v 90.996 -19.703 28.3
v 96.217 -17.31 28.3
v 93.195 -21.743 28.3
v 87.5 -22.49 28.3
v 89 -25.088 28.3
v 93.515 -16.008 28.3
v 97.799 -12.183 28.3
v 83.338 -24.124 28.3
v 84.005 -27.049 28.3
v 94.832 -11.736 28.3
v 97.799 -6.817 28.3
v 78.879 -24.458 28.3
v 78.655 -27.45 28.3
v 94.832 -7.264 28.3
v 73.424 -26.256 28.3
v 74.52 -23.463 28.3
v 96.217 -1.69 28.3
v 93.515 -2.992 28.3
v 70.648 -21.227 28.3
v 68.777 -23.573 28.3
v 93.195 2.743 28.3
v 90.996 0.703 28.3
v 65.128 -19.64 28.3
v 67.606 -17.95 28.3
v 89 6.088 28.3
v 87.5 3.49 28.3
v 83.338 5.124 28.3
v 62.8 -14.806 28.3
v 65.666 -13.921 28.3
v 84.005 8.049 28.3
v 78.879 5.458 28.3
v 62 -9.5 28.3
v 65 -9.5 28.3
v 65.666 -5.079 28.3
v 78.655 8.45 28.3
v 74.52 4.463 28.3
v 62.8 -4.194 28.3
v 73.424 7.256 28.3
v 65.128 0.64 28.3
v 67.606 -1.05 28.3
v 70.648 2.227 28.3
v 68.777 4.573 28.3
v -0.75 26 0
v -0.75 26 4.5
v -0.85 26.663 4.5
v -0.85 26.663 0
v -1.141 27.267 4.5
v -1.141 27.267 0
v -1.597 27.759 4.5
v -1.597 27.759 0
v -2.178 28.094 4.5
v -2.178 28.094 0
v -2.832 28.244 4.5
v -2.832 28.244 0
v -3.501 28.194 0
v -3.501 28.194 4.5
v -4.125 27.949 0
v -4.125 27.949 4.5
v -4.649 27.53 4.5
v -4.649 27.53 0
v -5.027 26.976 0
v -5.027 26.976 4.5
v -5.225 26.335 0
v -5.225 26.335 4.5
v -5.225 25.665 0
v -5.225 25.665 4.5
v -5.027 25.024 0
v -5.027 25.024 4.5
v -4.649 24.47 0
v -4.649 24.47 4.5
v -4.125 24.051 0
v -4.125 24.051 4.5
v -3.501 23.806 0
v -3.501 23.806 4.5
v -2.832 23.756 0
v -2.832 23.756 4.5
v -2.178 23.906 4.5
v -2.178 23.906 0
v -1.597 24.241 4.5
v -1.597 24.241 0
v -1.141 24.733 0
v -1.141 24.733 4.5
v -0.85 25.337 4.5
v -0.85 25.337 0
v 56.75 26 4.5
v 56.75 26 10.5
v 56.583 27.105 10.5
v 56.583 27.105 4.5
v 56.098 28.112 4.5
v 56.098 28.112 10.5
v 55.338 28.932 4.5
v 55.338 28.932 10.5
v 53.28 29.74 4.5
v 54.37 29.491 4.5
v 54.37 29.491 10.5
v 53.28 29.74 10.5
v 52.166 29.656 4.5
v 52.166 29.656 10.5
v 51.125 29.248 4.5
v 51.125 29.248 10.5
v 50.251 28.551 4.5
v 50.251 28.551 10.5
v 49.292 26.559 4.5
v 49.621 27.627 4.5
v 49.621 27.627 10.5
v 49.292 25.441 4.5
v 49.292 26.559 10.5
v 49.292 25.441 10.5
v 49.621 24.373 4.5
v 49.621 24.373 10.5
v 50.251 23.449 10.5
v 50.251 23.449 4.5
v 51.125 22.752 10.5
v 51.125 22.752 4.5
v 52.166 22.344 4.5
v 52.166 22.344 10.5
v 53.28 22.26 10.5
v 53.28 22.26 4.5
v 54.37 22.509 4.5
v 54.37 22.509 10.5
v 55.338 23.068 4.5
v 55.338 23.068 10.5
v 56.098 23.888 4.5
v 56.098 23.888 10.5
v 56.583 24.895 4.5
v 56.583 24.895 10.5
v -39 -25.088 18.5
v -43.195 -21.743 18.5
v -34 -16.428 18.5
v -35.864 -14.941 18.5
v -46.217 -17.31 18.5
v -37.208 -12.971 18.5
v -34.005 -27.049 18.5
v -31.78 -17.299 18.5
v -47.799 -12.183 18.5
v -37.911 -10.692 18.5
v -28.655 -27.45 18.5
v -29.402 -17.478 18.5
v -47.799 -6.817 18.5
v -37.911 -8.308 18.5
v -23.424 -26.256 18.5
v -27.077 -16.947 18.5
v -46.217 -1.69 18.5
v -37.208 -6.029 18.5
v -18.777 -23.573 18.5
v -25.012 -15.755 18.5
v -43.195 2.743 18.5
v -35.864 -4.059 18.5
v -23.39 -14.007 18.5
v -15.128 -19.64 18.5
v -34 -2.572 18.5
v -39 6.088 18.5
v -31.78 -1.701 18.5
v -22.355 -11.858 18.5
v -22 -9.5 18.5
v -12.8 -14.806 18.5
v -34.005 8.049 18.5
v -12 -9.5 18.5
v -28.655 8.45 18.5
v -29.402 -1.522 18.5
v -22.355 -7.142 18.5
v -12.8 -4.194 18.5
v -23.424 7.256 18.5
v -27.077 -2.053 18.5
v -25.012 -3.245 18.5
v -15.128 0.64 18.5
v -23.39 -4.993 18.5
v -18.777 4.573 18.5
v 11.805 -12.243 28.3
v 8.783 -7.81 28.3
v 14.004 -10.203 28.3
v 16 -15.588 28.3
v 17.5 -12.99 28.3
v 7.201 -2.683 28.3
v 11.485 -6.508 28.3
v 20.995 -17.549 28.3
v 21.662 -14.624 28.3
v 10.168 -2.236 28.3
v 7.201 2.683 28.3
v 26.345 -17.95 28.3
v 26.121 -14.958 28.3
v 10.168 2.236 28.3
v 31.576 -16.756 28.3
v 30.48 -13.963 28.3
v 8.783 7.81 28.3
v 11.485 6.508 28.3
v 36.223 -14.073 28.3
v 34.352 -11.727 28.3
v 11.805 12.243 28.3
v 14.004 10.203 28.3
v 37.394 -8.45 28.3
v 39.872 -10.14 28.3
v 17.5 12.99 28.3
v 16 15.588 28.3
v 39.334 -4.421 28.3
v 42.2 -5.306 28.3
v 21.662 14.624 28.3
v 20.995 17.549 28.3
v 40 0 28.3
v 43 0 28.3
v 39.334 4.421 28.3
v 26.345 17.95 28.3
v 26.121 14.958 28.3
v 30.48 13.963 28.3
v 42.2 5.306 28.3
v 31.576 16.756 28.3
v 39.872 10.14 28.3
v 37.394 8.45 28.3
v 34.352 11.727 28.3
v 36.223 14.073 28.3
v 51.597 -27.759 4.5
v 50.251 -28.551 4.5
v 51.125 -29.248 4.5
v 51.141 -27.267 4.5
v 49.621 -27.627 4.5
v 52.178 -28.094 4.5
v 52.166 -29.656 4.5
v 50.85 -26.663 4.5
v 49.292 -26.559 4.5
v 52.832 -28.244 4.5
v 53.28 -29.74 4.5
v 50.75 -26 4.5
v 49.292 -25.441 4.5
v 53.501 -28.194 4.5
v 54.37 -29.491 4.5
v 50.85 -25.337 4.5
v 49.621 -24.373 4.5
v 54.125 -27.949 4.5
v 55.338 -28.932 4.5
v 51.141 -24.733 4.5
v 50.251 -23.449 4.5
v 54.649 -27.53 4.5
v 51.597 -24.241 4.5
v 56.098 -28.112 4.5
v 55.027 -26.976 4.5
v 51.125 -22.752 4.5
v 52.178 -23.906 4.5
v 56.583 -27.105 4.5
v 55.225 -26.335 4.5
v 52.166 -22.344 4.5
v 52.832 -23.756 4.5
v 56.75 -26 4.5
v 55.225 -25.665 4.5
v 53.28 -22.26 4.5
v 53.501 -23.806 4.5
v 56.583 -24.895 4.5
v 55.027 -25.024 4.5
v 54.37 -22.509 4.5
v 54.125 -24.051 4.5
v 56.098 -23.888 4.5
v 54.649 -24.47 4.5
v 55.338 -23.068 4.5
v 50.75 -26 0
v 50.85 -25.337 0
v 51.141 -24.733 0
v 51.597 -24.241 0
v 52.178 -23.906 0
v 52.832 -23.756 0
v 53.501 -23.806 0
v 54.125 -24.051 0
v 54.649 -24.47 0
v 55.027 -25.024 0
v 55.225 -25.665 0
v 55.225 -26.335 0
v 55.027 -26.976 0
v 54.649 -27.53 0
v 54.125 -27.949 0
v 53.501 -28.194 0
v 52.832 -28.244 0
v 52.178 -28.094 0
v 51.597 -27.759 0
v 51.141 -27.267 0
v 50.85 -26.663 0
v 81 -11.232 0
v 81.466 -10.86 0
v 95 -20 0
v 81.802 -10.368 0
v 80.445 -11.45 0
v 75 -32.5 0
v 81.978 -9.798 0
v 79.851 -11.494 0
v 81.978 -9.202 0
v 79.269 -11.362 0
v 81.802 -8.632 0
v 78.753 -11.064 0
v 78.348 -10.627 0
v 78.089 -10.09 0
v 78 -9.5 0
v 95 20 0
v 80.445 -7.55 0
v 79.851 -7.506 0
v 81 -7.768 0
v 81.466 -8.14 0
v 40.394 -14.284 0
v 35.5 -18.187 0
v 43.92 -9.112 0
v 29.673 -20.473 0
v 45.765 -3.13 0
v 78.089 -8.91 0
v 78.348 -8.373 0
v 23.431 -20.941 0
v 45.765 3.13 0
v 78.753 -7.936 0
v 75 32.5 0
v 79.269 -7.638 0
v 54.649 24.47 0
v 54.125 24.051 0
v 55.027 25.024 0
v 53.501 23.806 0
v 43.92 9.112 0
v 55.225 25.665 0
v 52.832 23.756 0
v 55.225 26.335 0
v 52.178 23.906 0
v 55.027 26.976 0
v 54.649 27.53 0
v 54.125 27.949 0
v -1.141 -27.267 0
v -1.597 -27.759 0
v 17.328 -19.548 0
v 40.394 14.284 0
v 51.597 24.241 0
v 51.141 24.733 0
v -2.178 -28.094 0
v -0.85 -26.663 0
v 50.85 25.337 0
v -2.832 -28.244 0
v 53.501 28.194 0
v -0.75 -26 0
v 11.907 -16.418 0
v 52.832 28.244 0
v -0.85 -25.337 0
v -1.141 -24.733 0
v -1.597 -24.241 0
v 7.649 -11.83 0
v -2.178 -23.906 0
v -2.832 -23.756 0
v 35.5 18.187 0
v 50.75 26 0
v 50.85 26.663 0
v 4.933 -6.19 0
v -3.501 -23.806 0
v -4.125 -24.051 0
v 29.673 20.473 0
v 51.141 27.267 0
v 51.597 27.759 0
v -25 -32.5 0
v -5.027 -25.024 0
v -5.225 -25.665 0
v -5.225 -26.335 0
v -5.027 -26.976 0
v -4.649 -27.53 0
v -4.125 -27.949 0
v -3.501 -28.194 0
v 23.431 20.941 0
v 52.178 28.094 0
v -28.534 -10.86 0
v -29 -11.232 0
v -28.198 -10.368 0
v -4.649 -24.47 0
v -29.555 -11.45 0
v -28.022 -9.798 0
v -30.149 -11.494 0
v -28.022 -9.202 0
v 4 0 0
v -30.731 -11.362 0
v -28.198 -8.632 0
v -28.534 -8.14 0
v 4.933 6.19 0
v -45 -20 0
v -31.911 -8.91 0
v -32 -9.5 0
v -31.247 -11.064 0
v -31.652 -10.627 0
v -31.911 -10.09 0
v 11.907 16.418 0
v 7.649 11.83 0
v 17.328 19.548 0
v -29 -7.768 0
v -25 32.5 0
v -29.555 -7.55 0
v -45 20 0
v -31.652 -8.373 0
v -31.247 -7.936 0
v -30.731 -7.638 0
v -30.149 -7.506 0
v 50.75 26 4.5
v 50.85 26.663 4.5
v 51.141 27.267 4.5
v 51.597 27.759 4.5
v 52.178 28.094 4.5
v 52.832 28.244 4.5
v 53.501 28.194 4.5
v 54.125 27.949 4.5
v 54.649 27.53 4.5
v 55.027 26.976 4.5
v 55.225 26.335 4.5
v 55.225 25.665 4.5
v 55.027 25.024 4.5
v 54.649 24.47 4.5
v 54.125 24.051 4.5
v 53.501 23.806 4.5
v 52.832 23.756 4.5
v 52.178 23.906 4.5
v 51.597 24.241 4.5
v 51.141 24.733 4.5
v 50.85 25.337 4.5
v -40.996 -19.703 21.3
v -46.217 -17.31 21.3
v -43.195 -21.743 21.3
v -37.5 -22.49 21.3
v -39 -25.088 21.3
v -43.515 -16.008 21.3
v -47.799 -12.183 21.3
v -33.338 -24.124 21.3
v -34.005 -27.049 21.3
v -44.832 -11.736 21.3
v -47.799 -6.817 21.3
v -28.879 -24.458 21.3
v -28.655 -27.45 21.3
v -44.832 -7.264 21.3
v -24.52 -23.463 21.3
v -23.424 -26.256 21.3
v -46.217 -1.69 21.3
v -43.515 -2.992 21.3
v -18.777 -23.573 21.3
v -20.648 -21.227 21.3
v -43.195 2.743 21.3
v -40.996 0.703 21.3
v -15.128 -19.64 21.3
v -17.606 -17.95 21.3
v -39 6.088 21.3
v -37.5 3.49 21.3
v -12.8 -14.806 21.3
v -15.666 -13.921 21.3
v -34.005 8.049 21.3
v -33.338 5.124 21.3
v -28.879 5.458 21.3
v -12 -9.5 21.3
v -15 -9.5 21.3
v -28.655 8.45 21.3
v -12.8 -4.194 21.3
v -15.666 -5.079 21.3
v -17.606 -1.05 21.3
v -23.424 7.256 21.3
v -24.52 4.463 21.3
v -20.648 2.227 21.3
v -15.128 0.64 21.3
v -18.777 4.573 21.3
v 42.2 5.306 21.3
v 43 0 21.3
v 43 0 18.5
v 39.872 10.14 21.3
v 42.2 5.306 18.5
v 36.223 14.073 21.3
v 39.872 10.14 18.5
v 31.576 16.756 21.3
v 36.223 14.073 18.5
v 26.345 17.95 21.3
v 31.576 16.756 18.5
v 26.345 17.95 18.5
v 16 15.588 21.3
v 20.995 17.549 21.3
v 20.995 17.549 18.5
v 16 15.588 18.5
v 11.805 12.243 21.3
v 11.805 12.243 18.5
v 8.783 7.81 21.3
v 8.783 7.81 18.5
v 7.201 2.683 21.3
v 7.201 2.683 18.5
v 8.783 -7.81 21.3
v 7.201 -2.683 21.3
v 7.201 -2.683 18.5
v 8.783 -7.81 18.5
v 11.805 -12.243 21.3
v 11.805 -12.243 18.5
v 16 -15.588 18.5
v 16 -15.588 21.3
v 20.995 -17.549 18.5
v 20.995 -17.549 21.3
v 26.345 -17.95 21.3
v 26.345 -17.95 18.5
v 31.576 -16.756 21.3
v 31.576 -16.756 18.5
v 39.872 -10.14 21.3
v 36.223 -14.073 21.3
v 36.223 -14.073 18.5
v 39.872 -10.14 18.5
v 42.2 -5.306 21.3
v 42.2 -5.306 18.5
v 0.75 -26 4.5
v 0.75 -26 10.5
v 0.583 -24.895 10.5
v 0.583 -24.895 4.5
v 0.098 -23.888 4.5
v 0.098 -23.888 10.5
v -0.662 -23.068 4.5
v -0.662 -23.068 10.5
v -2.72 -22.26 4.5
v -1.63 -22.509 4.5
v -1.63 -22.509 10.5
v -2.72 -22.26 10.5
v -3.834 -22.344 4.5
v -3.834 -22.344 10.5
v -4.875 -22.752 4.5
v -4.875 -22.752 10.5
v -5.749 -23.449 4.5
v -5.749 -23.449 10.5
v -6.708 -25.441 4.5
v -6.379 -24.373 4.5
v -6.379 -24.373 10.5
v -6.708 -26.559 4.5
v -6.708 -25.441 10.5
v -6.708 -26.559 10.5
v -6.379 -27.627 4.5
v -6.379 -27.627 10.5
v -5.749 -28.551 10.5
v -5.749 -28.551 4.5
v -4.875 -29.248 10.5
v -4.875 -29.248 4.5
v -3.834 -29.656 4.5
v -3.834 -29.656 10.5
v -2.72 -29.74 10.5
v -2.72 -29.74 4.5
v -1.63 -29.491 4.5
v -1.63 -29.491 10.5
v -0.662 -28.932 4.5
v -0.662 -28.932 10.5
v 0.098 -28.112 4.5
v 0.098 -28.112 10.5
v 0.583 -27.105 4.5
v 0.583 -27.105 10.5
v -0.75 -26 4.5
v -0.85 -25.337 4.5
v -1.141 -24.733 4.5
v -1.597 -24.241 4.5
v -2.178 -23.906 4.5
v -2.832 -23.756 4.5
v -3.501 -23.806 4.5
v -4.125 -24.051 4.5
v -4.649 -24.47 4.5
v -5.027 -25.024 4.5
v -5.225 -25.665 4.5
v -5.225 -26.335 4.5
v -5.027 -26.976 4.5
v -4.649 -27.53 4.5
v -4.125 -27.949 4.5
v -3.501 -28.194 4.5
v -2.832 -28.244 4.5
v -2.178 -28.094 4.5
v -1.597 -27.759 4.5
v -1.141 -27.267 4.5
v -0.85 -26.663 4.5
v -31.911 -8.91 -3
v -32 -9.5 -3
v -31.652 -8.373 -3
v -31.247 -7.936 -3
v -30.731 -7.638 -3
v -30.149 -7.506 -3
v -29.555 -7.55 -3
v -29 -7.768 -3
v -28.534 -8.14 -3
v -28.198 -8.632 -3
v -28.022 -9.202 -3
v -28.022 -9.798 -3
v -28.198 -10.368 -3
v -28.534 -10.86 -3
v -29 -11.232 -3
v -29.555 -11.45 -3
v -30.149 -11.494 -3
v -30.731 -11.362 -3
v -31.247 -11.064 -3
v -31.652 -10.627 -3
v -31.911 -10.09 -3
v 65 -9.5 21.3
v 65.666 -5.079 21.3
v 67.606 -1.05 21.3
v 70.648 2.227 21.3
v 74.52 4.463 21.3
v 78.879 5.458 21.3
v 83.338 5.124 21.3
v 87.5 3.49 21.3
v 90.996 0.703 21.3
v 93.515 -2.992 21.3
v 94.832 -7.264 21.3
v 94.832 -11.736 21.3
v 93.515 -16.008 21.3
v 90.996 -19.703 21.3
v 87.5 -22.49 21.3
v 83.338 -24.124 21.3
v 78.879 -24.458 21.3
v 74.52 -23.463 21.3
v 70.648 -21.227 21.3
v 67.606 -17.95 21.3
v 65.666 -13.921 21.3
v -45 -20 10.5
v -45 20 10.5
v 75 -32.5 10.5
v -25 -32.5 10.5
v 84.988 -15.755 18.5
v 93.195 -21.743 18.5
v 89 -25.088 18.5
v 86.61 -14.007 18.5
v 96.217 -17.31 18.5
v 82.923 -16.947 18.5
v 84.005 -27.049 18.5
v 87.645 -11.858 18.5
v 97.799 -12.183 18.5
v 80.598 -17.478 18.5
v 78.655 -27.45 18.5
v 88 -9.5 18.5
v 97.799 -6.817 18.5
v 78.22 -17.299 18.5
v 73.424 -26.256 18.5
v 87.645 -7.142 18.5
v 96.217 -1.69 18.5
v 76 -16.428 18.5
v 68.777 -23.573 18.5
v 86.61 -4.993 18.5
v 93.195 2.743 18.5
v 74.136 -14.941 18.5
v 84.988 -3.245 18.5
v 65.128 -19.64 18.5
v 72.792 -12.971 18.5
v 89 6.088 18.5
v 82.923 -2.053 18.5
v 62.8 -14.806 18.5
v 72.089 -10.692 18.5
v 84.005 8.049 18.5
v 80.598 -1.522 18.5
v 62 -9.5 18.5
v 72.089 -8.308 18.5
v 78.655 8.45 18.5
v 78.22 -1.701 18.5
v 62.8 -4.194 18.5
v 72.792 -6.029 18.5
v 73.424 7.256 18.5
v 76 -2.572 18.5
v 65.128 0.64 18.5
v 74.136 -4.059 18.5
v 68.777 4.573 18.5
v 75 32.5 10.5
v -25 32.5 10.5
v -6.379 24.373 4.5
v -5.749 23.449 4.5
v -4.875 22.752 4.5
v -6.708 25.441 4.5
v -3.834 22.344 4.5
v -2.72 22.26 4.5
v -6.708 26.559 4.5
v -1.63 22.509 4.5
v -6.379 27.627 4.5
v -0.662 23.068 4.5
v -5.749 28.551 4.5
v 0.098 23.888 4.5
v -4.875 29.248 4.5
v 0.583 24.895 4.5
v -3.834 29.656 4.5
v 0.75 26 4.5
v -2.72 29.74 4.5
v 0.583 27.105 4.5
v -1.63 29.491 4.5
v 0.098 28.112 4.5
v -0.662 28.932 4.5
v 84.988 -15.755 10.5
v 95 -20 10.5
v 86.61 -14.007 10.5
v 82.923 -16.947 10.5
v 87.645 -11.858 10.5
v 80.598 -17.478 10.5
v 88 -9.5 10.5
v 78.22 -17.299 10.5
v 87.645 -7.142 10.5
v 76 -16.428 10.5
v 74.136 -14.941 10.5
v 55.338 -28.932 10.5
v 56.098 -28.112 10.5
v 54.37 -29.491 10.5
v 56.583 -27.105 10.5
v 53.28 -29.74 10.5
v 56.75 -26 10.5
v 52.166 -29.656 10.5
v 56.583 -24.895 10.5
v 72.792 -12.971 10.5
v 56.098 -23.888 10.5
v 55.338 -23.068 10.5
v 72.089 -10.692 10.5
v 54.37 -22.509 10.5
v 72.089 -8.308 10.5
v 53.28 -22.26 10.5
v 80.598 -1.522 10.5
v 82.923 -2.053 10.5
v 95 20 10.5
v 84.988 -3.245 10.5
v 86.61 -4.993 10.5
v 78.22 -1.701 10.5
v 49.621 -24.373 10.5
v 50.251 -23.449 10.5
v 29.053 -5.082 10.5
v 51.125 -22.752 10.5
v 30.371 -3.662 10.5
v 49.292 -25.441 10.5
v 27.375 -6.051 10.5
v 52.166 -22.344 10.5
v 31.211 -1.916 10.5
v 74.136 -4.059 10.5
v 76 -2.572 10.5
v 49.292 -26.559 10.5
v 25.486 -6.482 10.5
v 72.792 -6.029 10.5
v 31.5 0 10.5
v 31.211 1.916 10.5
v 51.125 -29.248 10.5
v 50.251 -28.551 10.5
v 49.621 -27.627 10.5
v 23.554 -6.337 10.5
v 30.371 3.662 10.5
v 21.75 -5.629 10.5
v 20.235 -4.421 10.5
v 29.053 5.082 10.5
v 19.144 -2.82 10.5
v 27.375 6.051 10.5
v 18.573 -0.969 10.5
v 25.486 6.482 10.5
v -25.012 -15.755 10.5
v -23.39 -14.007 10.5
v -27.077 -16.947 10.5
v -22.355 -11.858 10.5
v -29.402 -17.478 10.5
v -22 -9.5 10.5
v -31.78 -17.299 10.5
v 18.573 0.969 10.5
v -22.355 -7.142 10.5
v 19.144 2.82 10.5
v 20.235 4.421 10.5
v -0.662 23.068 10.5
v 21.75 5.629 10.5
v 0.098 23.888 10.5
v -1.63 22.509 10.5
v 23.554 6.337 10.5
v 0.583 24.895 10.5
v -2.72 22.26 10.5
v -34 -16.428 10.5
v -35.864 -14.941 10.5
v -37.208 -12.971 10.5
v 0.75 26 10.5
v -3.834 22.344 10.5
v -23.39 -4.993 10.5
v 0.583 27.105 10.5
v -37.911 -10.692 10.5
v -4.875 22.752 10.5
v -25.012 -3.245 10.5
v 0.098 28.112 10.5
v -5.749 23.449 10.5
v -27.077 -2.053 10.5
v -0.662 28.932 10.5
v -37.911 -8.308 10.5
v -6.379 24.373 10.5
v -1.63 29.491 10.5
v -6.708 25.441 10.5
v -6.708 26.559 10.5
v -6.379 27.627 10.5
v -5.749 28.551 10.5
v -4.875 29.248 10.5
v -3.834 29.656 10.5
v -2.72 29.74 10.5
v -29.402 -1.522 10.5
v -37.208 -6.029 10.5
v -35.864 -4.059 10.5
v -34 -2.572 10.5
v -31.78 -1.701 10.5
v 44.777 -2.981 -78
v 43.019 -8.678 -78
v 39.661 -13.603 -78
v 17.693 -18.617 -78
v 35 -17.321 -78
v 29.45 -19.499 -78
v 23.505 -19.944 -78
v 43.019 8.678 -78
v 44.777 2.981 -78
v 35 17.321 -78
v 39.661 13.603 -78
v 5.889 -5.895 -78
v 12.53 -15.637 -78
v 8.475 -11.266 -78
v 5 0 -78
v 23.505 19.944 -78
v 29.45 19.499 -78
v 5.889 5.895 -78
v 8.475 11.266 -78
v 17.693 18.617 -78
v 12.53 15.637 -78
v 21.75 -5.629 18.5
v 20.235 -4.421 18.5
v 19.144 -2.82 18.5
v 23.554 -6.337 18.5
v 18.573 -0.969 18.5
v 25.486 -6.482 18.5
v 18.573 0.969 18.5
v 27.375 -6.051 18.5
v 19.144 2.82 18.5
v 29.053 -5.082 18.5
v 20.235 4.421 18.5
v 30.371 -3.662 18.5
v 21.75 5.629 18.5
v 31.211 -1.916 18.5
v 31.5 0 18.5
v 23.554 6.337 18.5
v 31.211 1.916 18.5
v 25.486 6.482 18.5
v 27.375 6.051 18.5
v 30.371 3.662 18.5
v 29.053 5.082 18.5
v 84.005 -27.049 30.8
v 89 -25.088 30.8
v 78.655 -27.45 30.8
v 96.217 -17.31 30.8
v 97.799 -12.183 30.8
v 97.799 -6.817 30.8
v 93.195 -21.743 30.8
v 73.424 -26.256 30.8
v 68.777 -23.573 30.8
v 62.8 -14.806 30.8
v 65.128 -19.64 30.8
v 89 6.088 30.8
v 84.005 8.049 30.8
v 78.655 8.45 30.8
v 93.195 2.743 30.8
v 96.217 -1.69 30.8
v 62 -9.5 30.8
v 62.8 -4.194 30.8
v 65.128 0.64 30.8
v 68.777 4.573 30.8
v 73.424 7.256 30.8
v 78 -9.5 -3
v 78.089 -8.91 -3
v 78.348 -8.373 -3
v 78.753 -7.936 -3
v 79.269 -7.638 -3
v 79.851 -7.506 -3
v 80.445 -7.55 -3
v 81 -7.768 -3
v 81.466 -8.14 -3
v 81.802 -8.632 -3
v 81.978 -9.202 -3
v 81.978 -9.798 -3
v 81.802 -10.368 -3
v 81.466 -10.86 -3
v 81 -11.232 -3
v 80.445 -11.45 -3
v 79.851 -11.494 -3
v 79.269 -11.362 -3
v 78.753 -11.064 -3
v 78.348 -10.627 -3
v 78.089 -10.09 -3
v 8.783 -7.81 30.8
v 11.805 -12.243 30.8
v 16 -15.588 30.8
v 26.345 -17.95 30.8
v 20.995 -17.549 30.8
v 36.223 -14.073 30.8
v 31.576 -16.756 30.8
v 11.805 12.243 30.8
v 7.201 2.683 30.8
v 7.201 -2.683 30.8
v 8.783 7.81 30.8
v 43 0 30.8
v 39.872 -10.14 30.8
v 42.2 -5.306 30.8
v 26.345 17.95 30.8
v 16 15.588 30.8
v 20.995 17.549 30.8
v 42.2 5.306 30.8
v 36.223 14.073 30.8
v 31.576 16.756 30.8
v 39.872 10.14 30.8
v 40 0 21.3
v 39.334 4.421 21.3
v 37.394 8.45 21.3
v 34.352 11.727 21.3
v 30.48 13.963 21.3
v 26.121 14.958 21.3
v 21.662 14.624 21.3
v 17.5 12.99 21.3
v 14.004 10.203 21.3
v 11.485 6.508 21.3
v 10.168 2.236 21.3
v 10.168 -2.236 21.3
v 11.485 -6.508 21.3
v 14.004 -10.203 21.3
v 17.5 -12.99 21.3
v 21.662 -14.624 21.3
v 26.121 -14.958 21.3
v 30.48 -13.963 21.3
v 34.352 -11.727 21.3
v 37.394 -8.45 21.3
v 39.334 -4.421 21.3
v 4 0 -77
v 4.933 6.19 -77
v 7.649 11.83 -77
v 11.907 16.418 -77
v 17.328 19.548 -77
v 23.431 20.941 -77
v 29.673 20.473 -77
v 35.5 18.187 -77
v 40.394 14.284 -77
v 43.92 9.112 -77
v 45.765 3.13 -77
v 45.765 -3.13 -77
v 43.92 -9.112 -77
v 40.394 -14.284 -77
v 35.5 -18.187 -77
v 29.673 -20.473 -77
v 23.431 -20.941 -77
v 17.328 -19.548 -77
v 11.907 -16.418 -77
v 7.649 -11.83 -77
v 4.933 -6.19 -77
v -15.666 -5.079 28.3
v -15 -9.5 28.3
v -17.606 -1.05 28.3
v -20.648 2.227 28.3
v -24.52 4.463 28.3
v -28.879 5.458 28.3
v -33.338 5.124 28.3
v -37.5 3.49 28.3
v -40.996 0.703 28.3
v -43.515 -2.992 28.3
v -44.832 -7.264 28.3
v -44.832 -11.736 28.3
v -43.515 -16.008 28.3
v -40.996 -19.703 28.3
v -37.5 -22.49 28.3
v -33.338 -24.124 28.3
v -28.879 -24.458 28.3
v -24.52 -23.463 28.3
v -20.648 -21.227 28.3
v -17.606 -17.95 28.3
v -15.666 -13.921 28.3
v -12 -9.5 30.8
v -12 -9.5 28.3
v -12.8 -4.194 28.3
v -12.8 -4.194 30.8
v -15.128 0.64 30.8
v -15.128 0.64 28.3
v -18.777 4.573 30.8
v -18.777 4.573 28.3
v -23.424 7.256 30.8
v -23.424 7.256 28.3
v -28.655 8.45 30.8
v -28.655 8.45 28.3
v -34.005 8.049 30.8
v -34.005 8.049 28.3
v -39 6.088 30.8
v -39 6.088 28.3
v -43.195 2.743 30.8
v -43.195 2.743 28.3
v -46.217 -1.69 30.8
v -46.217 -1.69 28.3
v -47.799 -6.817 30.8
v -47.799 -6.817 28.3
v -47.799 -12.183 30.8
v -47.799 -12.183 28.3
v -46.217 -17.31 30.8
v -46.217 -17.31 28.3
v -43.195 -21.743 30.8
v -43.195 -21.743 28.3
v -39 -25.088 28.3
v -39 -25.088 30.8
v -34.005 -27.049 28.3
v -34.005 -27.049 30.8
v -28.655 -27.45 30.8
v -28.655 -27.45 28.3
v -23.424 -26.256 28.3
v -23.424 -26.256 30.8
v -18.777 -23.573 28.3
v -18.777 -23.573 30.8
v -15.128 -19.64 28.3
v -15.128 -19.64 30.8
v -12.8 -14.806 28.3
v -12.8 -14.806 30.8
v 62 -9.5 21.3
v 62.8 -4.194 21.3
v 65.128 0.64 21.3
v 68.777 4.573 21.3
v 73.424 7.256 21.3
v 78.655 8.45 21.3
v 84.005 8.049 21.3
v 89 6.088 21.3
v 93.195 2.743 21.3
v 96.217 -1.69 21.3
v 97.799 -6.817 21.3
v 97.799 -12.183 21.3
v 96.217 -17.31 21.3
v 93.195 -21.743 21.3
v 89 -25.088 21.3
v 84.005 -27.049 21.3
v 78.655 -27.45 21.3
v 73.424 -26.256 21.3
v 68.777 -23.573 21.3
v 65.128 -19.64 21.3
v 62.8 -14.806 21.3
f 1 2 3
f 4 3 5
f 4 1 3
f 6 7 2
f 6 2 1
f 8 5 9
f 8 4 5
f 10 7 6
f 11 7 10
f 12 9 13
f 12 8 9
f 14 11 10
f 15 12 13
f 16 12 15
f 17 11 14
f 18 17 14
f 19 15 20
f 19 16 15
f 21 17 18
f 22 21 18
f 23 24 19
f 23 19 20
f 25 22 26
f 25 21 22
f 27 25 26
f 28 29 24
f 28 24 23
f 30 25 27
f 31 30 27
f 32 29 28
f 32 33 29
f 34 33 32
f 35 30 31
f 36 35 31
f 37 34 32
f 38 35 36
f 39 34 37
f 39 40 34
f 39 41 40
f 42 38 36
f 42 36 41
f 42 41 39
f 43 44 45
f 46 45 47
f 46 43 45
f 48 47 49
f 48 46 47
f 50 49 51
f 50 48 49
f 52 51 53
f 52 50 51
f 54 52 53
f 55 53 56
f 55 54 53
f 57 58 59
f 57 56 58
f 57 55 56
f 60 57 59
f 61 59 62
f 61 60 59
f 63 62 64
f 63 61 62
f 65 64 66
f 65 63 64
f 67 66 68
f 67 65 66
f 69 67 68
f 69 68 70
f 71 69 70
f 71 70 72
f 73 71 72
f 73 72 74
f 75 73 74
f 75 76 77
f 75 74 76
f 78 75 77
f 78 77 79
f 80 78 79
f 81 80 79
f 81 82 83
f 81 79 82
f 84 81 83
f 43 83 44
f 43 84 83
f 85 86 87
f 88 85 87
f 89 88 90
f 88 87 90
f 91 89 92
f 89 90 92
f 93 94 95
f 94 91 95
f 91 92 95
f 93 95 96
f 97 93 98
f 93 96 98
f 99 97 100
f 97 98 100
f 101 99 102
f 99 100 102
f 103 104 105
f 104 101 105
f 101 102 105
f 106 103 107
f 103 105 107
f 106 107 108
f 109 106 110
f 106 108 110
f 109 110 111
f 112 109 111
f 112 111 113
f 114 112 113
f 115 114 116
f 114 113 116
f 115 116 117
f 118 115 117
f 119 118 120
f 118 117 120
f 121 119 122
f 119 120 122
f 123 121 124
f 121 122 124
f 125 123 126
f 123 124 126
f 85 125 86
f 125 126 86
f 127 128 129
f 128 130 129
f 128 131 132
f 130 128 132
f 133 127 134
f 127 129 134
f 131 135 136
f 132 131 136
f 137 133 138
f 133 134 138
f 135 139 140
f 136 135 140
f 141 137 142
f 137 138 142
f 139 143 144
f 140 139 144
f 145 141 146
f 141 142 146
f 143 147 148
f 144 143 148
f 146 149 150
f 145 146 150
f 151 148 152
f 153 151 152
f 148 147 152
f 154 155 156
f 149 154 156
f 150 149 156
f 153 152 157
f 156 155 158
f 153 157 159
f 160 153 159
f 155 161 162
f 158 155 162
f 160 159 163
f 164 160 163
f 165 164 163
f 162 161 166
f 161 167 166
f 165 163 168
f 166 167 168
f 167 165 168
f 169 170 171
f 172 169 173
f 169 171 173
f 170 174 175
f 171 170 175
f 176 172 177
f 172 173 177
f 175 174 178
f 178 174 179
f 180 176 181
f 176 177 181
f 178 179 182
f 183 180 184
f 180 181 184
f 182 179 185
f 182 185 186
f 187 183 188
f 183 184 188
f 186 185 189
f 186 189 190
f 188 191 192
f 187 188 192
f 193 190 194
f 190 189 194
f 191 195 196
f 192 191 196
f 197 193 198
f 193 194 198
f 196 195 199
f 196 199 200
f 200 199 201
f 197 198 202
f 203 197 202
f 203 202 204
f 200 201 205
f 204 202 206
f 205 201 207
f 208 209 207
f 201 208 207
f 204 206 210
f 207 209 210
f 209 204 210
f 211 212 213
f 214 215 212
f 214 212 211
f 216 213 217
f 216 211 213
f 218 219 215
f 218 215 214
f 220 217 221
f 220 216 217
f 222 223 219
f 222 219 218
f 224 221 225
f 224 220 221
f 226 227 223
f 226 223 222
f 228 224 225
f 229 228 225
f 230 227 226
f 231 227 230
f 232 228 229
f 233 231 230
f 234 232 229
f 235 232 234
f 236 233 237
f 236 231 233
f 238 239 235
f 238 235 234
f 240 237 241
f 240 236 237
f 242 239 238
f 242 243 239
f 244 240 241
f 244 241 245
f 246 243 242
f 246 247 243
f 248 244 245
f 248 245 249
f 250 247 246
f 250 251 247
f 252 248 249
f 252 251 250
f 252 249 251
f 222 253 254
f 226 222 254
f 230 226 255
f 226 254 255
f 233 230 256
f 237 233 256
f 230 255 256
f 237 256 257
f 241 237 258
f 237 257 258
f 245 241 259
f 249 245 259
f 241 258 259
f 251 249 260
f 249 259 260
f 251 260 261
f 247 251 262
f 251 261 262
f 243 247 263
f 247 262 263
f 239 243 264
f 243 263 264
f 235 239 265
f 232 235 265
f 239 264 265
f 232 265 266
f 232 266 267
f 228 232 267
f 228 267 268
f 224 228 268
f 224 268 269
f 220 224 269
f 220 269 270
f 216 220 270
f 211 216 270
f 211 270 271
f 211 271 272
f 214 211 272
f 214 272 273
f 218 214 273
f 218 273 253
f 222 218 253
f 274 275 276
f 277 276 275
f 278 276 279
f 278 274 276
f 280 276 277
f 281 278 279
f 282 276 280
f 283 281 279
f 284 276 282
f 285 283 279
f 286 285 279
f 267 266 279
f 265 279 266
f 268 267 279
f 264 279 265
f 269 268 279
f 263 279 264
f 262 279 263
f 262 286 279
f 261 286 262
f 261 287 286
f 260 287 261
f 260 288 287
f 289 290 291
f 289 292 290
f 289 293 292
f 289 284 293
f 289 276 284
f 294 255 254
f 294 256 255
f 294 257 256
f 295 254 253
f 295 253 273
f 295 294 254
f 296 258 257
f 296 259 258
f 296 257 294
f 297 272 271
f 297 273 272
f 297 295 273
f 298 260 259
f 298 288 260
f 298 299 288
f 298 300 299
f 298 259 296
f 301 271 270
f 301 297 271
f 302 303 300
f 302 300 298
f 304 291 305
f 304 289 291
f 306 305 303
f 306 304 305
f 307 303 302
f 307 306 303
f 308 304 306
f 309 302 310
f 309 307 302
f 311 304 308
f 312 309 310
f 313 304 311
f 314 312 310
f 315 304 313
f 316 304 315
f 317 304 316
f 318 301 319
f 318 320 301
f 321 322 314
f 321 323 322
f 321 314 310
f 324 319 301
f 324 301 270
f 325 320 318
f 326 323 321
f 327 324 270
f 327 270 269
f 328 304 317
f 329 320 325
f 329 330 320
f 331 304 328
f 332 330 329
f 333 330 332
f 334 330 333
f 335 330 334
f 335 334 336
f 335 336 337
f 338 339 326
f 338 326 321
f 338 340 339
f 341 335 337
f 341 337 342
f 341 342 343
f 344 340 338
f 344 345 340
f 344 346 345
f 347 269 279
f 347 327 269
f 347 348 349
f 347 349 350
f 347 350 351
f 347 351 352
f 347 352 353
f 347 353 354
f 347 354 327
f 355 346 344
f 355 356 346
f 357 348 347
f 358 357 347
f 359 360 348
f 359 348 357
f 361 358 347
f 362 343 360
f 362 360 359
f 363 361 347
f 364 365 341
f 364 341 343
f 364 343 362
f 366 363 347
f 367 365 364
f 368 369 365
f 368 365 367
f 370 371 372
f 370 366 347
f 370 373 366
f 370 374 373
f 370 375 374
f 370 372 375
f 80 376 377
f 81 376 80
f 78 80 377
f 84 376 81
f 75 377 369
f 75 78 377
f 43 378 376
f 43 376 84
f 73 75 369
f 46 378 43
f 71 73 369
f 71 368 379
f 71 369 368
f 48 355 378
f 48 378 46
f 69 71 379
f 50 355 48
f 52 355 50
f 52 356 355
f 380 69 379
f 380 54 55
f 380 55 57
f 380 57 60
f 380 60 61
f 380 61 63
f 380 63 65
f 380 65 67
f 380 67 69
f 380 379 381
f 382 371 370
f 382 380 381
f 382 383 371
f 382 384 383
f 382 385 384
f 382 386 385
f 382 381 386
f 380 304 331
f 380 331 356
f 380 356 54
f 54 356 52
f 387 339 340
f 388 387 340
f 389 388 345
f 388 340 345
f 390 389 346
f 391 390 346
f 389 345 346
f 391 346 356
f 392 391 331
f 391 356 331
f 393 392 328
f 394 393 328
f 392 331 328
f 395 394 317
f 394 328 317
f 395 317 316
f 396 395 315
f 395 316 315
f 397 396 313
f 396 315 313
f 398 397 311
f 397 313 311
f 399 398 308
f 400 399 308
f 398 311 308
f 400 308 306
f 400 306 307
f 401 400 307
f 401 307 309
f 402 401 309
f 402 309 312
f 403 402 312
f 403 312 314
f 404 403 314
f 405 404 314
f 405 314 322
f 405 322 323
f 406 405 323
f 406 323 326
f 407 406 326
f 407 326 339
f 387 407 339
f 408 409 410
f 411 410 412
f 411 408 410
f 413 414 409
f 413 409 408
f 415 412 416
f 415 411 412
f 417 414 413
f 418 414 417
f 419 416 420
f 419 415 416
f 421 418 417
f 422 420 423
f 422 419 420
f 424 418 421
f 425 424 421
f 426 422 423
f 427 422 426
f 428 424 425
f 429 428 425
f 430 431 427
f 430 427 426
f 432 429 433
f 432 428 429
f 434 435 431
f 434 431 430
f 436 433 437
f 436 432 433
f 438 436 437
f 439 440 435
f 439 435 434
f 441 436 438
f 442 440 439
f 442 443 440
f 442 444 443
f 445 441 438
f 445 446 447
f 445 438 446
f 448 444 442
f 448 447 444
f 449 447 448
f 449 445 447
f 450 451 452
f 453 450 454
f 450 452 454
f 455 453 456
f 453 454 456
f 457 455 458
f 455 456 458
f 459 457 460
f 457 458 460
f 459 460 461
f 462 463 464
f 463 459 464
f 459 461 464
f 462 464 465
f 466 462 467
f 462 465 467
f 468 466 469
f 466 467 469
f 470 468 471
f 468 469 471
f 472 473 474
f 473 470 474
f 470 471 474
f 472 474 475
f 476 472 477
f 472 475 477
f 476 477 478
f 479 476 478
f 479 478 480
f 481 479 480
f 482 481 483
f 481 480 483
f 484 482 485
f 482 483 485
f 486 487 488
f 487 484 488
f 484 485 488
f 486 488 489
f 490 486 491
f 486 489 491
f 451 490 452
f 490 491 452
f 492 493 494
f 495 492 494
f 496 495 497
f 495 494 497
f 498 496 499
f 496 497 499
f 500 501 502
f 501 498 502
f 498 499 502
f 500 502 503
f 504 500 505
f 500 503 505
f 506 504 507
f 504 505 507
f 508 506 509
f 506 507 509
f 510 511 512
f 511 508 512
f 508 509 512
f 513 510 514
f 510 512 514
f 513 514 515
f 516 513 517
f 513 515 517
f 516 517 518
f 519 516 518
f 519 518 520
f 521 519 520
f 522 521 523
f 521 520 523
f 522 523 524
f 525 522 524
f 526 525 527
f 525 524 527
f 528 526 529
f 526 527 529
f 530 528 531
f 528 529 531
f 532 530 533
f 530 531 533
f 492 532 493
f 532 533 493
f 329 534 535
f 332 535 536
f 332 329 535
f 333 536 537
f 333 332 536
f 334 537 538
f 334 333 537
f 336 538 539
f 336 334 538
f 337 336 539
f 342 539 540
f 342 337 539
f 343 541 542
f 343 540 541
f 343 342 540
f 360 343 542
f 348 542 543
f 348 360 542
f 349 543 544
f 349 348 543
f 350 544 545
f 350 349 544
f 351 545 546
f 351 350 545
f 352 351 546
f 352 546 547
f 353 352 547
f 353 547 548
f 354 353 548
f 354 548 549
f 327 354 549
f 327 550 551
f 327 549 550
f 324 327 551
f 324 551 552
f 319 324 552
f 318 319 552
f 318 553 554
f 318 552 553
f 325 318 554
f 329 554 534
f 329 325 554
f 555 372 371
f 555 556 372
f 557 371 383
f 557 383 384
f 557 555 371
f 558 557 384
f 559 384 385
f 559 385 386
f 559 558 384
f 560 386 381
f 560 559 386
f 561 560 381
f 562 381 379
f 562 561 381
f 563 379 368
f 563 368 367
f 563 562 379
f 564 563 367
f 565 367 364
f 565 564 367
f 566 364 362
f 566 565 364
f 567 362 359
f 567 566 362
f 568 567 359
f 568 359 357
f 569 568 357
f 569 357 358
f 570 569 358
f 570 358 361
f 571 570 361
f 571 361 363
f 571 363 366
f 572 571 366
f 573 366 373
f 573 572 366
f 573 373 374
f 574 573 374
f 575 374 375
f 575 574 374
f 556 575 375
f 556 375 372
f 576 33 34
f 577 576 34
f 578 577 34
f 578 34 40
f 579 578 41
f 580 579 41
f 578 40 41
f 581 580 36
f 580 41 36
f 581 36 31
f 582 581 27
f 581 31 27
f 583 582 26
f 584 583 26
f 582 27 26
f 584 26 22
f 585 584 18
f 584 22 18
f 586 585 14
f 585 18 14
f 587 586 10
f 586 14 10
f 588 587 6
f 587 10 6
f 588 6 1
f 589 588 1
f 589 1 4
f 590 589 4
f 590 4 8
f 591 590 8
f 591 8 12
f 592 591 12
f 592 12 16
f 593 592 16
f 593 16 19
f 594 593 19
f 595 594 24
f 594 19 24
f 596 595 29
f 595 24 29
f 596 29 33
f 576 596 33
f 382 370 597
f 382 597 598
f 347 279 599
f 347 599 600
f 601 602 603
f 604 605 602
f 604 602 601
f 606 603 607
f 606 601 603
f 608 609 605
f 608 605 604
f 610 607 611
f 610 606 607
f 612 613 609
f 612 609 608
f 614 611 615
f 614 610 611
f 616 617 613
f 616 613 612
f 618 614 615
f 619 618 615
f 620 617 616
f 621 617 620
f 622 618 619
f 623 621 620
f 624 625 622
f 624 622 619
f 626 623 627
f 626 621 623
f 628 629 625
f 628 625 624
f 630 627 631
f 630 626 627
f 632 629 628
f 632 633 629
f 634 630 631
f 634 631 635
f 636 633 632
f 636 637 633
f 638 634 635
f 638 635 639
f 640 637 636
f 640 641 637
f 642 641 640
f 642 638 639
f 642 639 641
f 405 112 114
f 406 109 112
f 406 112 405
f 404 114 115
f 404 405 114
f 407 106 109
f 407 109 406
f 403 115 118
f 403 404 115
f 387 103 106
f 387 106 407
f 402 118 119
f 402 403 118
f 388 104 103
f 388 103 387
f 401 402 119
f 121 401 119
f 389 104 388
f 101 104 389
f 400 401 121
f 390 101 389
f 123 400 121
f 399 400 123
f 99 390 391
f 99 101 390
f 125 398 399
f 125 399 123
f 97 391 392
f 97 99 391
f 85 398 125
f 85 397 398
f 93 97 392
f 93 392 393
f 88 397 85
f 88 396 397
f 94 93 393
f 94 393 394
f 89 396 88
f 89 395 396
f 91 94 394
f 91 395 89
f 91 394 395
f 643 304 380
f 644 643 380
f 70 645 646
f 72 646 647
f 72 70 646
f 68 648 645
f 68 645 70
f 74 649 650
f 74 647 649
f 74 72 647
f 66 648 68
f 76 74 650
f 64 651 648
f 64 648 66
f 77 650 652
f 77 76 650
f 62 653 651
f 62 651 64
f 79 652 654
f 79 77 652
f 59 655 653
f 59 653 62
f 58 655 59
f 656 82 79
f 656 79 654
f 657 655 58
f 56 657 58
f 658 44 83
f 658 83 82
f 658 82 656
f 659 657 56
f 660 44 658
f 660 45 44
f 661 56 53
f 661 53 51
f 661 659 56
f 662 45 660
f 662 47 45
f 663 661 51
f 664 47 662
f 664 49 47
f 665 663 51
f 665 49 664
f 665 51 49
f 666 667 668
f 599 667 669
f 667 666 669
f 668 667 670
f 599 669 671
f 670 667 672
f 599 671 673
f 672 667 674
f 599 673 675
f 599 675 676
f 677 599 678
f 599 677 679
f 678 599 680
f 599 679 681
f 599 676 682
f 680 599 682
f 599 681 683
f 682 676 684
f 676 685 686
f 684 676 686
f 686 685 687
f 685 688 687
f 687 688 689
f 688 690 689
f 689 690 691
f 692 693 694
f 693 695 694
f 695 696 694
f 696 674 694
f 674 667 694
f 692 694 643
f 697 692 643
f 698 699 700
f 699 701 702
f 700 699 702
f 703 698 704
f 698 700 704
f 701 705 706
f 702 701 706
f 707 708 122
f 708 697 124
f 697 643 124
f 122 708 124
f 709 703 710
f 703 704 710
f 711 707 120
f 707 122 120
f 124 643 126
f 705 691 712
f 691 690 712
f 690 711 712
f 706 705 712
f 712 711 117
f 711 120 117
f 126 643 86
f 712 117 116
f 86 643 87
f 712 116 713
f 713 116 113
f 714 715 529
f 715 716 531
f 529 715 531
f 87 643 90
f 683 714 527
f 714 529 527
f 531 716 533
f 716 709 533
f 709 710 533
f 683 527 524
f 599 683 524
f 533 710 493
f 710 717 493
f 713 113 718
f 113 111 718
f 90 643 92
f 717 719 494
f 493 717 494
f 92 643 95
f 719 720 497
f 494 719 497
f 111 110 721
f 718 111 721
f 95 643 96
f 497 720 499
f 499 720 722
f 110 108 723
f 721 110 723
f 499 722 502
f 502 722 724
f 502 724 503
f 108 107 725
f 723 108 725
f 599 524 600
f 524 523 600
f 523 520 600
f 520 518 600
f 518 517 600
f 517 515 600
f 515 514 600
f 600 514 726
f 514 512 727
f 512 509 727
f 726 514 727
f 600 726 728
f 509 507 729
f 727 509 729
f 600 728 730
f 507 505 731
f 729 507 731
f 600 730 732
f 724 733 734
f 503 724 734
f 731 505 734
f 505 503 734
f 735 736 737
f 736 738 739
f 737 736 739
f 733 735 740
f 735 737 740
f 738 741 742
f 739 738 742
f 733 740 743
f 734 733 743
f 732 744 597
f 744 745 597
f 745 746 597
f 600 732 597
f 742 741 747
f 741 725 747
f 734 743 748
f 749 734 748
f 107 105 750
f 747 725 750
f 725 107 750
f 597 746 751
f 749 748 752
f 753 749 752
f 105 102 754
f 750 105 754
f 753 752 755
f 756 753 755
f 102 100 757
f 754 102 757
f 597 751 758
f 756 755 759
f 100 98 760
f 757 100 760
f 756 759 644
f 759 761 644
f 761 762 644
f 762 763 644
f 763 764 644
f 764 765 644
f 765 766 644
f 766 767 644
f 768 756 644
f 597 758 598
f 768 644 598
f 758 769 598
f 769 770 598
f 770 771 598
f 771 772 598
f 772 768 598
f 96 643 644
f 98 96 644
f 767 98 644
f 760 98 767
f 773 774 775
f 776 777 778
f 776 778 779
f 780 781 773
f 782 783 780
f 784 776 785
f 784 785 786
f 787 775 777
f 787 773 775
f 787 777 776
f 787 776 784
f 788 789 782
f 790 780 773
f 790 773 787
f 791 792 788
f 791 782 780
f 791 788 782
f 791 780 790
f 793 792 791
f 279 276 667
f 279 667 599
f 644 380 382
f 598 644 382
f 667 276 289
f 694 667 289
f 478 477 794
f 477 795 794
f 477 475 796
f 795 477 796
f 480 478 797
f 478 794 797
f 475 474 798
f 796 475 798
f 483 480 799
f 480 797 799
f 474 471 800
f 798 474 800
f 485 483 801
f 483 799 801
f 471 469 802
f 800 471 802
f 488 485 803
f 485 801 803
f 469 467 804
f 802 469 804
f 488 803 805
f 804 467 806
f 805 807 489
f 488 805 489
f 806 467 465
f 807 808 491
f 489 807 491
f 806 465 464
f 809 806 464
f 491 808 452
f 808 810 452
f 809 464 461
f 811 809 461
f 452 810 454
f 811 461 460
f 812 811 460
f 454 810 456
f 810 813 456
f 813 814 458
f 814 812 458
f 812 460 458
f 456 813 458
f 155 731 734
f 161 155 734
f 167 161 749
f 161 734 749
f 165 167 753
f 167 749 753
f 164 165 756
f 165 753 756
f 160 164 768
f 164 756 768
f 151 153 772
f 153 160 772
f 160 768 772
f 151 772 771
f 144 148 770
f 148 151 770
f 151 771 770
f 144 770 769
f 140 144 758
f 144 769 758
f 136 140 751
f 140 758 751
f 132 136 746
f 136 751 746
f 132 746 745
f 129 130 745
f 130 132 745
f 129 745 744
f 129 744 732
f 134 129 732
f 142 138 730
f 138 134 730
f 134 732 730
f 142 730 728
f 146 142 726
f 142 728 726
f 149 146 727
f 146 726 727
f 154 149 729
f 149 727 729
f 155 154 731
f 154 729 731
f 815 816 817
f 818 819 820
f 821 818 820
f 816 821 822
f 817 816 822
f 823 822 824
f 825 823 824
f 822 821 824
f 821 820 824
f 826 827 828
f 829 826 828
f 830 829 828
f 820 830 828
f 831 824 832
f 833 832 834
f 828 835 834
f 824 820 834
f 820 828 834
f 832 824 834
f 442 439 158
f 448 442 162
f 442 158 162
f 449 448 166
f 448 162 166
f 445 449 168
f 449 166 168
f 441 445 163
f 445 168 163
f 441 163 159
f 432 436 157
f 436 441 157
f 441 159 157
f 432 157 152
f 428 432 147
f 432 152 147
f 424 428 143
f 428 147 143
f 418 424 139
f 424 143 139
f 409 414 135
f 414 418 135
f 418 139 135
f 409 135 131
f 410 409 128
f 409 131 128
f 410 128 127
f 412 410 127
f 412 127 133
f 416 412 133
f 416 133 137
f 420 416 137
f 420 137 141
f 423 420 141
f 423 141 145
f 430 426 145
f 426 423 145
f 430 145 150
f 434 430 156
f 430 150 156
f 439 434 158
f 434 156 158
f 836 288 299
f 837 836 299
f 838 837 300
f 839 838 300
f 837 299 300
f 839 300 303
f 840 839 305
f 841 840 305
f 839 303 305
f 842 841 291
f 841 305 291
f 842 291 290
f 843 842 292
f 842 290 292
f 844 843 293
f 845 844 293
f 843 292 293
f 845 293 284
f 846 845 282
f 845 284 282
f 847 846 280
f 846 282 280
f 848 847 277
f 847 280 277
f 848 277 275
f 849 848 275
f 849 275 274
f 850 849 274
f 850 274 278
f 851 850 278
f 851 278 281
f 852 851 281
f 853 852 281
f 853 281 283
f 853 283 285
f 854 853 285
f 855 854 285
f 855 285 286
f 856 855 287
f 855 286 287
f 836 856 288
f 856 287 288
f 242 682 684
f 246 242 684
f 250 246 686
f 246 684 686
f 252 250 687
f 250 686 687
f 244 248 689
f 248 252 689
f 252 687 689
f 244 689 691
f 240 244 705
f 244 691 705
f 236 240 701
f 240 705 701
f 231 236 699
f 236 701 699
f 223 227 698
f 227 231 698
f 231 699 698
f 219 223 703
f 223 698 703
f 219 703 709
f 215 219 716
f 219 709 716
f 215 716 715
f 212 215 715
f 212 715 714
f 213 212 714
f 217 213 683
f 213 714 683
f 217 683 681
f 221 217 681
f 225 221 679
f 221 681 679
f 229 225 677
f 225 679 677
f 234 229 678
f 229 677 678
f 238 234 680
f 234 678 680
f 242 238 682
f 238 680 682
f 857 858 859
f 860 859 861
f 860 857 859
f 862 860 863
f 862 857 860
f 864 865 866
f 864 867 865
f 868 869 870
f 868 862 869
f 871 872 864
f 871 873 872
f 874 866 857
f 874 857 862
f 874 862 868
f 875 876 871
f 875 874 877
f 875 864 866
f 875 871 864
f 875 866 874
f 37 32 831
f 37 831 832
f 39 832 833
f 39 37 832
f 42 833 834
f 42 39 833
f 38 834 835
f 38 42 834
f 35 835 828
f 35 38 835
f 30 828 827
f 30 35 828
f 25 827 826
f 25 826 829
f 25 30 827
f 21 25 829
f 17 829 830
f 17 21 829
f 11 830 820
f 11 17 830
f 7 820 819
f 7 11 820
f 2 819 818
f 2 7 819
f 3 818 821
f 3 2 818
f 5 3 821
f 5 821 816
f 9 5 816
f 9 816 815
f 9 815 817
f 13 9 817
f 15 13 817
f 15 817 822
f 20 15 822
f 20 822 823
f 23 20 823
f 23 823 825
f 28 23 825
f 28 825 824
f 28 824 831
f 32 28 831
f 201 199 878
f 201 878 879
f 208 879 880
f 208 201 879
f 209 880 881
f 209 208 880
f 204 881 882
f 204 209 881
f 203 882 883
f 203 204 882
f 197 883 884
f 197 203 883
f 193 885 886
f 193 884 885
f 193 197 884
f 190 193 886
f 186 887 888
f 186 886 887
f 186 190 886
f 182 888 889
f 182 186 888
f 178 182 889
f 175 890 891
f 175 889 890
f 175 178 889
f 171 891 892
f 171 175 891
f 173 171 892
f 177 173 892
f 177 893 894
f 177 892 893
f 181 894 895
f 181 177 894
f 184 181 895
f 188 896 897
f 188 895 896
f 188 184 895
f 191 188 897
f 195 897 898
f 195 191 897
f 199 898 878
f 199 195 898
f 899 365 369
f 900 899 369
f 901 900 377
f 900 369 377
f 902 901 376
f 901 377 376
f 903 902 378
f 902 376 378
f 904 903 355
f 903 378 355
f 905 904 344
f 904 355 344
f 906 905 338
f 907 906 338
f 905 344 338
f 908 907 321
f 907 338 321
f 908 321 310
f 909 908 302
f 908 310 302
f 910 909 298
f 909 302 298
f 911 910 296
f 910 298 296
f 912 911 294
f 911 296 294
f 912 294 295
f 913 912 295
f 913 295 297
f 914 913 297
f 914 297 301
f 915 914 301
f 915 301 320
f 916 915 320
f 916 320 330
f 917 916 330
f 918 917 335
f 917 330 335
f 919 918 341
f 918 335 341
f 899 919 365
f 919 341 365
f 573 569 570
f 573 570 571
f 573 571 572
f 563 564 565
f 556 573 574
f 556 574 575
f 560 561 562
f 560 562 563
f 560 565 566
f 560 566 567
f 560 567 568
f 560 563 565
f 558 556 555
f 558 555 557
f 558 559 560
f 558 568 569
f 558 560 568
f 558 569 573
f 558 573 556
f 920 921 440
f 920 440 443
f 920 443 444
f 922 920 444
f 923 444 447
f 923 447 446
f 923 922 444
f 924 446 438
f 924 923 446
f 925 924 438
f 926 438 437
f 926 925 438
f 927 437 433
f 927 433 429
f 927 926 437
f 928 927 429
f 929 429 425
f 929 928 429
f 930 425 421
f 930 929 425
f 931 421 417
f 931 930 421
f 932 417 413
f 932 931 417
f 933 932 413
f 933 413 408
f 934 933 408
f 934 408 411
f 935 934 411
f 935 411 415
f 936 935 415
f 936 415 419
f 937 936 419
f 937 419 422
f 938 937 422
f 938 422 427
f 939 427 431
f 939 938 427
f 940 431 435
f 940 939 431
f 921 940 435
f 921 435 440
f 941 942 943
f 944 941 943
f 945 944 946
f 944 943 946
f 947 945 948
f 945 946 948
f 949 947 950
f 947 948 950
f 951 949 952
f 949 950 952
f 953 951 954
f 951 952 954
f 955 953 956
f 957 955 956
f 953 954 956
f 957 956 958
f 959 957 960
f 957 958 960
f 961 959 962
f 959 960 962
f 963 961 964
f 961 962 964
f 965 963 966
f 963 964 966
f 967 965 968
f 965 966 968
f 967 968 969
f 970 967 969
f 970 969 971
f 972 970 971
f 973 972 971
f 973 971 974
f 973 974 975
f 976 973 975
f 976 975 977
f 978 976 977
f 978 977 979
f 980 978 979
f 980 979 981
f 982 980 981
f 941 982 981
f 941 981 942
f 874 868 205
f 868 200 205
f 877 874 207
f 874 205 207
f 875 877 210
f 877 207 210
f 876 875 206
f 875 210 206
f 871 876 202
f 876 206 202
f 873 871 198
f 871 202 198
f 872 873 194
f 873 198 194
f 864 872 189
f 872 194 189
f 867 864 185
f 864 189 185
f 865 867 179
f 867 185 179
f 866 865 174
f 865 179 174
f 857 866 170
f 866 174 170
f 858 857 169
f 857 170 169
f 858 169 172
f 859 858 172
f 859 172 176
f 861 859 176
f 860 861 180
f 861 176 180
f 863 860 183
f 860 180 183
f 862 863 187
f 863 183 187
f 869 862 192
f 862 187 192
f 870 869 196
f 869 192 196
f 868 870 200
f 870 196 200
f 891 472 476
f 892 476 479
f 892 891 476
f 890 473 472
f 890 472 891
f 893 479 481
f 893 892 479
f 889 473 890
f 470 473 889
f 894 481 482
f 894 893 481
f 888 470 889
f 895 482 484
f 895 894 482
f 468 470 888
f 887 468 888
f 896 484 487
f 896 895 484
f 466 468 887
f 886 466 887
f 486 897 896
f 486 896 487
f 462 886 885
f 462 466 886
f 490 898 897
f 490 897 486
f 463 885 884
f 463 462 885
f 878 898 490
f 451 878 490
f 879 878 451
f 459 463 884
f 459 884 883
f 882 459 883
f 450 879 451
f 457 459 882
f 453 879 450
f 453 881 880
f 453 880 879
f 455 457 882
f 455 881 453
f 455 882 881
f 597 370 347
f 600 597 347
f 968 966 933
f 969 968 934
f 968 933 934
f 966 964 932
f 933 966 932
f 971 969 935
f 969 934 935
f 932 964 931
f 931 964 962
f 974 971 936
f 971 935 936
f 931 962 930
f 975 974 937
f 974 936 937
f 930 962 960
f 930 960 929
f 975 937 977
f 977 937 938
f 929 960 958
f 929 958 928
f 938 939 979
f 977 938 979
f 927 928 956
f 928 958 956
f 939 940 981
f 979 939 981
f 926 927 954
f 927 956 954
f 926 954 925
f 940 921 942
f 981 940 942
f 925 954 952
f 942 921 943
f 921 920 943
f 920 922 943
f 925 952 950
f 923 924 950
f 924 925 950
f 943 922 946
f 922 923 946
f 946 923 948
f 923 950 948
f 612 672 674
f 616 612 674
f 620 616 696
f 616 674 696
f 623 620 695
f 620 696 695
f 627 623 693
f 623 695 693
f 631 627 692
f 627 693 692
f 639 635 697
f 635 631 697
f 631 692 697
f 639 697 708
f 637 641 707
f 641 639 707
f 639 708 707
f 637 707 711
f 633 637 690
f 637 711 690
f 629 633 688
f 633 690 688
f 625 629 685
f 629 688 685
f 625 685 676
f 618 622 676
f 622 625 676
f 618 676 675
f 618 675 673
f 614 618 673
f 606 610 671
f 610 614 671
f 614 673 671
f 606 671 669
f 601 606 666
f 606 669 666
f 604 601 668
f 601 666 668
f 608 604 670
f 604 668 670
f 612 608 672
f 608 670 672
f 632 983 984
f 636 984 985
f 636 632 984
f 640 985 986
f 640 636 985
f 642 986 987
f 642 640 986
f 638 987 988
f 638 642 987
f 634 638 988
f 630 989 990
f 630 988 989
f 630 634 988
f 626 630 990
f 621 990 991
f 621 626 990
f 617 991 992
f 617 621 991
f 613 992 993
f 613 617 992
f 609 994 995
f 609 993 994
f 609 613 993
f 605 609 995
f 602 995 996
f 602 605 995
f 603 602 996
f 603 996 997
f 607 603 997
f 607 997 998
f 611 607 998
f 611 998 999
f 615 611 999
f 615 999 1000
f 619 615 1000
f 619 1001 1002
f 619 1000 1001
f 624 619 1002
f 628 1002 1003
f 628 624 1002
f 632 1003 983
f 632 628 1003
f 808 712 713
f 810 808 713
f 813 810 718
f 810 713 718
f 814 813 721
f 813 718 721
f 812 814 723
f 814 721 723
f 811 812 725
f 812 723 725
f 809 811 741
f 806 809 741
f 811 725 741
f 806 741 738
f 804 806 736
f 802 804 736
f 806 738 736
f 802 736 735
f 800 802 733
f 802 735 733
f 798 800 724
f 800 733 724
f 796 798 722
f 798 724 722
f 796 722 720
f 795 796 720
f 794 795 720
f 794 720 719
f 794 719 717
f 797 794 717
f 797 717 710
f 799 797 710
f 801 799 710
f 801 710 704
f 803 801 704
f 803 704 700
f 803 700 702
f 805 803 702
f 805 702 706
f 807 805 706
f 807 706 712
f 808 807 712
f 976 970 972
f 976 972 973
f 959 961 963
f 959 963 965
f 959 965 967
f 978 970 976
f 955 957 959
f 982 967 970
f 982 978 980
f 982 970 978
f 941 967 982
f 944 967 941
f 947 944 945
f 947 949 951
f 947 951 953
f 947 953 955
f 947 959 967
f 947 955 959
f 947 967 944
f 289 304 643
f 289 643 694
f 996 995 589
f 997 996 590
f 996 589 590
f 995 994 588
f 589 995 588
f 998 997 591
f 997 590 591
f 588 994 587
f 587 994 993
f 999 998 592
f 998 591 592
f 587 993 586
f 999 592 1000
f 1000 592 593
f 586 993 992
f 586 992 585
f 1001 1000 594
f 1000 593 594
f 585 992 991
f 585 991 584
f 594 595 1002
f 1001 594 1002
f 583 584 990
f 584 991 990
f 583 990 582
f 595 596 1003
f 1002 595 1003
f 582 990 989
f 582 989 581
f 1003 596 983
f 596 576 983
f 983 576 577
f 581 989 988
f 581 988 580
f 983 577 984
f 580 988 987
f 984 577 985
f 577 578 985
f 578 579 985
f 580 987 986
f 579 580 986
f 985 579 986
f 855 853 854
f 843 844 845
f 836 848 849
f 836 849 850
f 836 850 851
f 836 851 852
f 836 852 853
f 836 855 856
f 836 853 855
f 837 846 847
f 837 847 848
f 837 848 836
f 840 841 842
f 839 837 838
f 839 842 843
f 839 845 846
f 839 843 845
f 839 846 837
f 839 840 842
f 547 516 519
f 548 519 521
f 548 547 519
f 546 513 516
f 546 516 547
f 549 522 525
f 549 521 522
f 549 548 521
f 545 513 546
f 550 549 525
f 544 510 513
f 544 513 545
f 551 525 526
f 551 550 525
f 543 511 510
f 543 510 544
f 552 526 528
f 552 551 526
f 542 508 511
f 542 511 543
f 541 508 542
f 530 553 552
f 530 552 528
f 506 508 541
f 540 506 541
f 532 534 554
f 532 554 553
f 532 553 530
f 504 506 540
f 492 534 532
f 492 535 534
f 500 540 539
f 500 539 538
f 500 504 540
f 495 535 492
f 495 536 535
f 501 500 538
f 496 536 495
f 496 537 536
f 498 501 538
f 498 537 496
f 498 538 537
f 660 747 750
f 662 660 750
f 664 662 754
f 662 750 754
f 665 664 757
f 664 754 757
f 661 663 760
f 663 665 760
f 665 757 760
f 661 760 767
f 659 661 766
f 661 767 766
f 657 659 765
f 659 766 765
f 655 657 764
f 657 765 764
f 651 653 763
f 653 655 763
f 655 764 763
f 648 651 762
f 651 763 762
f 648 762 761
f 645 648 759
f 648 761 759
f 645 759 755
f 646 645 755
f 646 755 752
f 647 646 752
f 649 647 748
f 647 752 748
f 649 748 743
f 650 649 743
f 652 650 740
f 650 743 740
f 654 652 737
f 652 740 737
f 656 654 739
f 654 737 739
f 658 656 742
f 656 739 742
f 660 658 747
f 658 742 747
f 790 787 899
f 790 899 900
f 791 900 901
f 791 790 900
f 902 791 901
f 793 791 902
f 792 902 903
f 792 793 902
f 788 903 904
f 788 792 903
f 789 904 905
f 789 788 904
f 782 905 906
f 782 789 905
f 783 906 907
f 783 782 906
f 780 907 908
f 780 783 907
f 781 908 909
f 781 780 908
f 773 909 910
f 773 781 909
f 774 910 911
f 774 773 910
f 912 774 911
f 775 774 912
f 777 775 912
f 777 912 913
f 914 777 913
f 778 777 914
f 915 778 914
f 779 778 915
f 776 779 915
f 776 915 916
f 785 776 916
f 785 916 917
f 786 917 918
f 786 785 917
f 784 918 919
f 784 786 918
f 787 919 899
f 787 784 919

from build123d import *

# Parameters (mm, degrees)
SKETCH1_W           = 20
SKETCH1_H           = 40
SKETCH1_W_2         = 50
SKETCH1_H_2         = 65
SKETCH1_R           = 2.25
BOSS_EXTRUDE1_DEPTH = 10.5
SKETCH3_R           = 6.5
SKETCH3_R_2         = 8
BOSS_EXTRUDE2_DEPTH = 8
SKETCH4_R           = 3.75
CUT_EXTRUDE1_DEPTH  = 6
SKETCH5_R           = 18
BOSS_EXTRUDE3_DEPTH = 12.3
SKETCH7_W           = 167.229187532
SKETCH7_H           = 99.836007656
SKETCH7_R           = 15
CUT_EXTRUDE2_DEPTH  = 7
SKETCH8_R           = 21
BOSS_EXTRUDE4_DEPTH = 78
CHAMFER1_SIZE       = 1
SKETCH9_R           = 2
BOSS_EXTRUDE5_DEPTH = 3


with BuildPart() as part:
    # Sketch1 → Boss-Extrude1 (new body)
    with BuildSketch(Plane.XY):
        Polygon((-25, -20), (-45, -20), (-25, -32.5), align=None)
        with Locations((-35, 0)):
            Rectangle(SKETCH1_W, SKETCH1_H)
        Polygon((-25, 20), (-25, 32.5), (-45, 20), align=None)
        Rectangle(SKETCH1_W_2, SKETCH1_H_2)
        with Locations((-3, 26)):
            Circle(SKETCH1_R, mode=Mode.SUBTRACT)
        with Locations((-3, -26)):
            Circle(SKETCH1_R, mode=Mode.SUBTRACT)
    boss_extrude1 = extrude(amount=BOSS_EXTRUDE1_DEPTH)

    # Mirror1: Boss-Extrude1 across plane
    add(boss_extrude1.mirror(Plane(origin=(25, 0, 10.5), x_dir=(0, 0, 1), z_dir=(1, 0, 0))))

    # Sketch3 → Boss-Extrude2 (add)
    with BuildSketch(Plane.XY.offset(10.5)):
        with Locations((25, 0)):
            Circle(SKETCH3_R)
        with Locations((-30, -9.5)):
            Circle(SKETCH3_R_2)
        with Locations((80, -9.5)):
            Circle(SKETCH3_R_2)
    extrude(amount=BOSS_EXTRUDE2_DEPTH)

    # Sketch4 → Cut-Extrude1 (cut)
    with BuildSketch(Plane.XY.offset(10.5)):
        with Locations((-3, -26)):
            Circle(SKETCH4_R)
        with Locations((-3, 26)):
            Circle(SKETCH4_R)
        with Locations((53, 26)):
            Circle(SKETCH4_R)
        with Locations((53, -26)):
            Circle(SKETCH4_R)
    extrude(amount=-CUT_EXTRUDE1_DEPTH, mode=Mode.SUBTRACT)

    # Sketch5 → Boss-Extrude3 (add)
    with BuildSketch(Plane.XY.offset(18.5)):
        with Locations((25, 0)):
            Circle(SKETCH5_R)
        with Locations((-30, -9.5)):
            Circle(SKETCH5_R)
    extrude(amount=BOSS_EXTRUDE3_DEPTH)

    # Sketch7 → Cut-Extrude2 (cut)
    with BuildSketch(Plane.XY.offset(28.3)):
        with Locations((-30, -9.5)):
            Rectangle(SKETCH7_W, SKETCH7_H)
        with Locations((-30, -9.5)):
            Circle(SKETCH7_R, mode=Mode.SUBTRACT)
        with Locations((25, 0)):
            Circle(SKETCH7_R, mode=Mode.SUBTRACT)
    extrude(amount=-CUT_EXTRUDE2_DEPTH, mode=Mode.SUBTRACT)

    # Mirror2: part across plane


with BuildPart() as part_1:
    add(part.part)
    add(part.part.mirror(Plane(origin=(25, 0, 0), x_dir=(0, 0, 1), z_dir=(1, 0, 0))))

    # Sketch8 → Boss-Extrude4 (add)
    with BuildSketch(Plane(origin=(0, 0, 0), x_dir=(-1, 0, 0), z_dir=(0, 0, -1))):
        with Locations((-25, 0)):
            Circle(SKETCH8_R)
    extrude(amount=BOSS_EXTRUDE4_DEPTH)

    # Chamfer1
    chamfer1_edges = [part_1.edges().sort_by_distance(p)[0] for p in [
        (46, 0, -78),
    ]]
    chamfer(chamfer1_edges, length=CHAMFER1_SIZE)

    # Sketch9 → Boss-Extrude5 (add, symmetric)
    with BuildSketch(Plane(origin=(0, 0, 0), x_dir=(-1, 0, 0), z_dir=(0, 0, -1))):
        with Locations((-80, -9.5)):
            Circle(SKETCH9_R)
        with Locations((30, -9.5)):
            Circle(SKETCH9_R)
    extrude(amount=BOSS_EXTRUDE5_DEPTH, both=True)


solid = part_1.part
